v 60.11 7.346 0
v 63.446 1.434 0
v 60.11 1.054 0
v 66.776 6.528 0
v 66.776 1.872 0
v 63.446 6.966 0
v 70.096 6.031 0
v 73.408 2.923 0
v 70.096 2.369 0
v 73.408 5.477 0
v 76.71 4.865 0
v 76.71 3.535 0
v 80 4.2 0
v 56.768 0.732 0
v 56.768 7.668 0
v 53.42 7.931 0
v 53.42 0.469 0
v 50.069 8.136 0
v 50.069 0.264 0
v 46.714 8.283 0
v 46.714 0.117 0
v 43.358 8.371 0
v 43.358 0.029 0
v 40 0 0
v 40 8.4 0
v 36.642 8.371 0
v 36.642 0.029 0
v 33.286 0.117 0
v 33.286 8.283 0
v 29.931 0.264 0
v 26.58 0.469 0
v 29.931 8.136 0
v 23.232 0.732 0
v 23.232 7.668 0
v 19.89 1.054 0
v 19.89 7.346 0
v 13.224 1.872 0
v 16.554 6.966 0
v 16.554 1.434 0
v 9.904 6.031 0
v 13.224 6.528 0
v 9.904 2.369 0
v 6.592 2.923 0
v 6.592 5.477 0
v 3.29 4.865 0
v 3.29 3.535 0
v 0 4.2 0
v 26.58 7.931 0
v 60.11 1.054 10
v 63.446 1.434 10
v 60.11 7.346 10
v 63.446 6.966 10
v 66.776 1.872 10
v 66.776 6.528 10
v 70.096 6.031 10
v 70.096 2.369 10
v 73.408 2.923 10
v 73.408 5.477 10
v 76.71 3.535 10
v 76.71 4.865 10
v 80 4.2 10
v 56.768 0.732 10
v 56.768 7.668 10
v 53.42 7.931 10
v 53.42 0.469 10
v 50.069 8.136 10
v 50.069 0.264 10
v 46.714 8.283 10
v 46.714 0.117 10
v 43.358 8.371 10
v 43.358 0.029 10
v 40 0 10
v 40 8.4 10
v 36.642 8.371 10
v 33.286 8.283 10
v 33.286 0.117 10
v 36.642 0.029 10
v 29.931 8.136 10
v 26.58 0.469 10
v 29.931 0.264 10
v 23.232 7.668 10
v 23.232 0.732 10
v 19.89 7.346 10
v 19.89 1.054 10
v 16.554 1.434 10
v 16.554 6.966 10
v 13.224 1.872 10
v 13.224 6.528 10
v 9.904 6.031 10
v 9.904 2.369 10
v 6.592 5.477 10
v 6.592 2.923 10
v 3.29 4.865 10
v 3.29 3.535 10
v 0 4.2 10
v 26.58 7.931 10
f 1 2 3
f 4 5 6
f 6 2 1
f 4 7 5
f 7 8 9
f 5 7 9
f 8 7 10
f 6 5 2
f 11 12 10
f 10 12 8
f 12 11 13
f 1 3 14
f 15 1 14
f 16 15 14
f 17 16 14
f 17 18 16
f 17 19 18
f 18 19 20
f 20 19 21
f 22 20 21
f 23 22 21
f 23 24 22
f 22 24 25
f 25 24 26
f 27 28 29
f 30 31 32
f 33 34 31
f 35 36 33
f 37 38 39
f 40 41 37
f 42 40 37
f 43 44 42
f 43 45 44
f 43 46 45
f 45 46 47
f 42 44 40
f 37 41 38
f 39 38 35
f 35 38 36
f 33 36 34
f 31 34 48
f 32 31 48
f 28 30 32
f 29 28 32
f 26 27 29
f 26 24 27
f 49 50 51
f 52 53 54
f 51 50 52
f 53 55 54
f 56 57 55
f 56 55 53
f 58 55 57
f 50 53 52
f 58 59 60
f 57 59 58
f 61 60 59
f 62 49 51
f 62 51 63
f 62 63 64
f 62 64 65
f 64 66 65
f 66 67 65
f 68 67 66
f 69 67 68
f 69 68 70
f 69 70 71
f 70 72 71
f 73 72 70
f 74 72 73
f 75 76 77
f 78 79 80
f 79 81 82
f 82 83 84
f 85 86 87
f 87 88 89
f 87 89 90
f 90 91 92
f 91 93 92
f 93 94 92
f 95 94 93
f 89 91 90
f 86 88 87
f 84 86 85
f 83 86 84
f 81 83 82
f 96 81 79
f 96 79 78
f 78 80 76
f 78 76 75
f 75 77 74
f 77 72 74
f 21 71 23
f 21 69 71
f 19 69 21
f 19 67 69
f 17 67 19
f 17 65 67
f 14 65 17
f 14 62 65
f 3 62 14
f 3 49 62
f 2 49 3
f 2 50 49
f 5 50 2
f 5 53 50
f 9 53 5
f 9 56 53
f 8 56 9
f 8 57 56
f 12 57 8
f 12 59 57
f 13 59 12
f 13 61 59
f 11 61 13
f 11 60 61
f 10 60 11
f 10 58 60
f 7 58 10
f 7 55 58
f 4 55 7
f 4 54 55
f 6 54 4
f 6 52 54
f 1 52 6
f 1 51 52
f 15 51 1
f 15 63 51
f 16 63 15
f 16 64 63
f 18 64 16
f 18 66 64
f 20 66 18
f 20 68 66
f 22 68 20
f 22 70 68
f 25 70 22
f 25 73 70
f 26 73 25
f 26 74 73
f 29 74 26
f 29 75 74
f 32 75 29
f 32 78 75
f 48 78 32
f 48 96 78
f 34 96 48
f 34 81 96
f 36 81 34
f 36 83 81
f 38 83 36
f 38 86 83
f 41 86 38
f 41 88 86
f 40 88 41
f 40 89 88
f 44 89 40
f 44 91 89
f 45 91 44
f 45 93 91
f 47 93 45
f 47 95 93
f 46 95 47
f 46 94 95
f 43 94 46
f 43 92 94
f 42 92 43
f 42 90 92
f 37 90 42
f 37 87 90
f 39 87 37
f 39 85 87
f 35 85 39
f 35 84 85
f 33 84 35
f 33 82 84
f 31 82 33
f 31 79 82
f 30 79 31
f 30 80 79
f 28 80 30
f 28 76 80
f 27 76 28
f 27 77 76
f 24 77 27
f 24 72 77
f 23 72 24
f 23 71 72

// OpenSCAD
$fn = 32;

// ----------------------------------------------------------------------
// Arc profile plate: lens, 48 points
// ----------------------------------------------------------------------

// --- parameters (mm) ---
lens_chord = 80;          // chord length of the lens, X
arc_r = 192.39;           // radius of both arcs
arc_angle = 24;           // angle of each arc, degrees
sagitta = 4.2;            // bulge of each arc (half the lens height)
arc_step = 1;             // sampling step of the arcs, degrees
plate_t = 10;             // plate thickness, Z

bbox_y = 2 * sagitta;  // full lens height

profile = [[80, 4.2], [76.71, 4.865], [73.408, 5.477], [70.096, 6.031], [66.776, 6.528], [63.446, 6.966], [60.11, 7.346], [56.768, 7.668], [53.42, 7.931], [50.069, 8.136], [46.714, 8.283], [43.358, 8.371], [40, 8.4], [36.642, 8.371], [33.286, 8.283], [29.931, 8.136], [26.58, 7.931], [23.232, 7.668], [19.89, 7.346], [16.554, 6.966], [13.224, 6.528], [9.904, 6.031], [6.592, 5.477], [3.29, 4.865], [0, 4.2], [3.29, 3.535], [6.592, 2.923], [9.904, 2.369], [13.224, 1.872], [16.554, 1.434], [19.89, 1.054], [23.232, 0.732], [26.58, 0.469], [29.931, 0.264], [33.286, 0.117], [36.642, 0.029], [40, 0], [43.358, 0.029], [46.714, 0.117], [50.069, 0.264], [53.42, 0.469], [56.768, 0.732], [60.11, 1.054], [63.446, 1.434], [66.776, 1.872], [70.096, 2.369], [73.408, 2.923], [76.71, 3.535]];  // primary outline, 48 points, counter clockwise

// --- the one profile operation ---
linear_extrude(height = plate_t) polygon(points = profile);
